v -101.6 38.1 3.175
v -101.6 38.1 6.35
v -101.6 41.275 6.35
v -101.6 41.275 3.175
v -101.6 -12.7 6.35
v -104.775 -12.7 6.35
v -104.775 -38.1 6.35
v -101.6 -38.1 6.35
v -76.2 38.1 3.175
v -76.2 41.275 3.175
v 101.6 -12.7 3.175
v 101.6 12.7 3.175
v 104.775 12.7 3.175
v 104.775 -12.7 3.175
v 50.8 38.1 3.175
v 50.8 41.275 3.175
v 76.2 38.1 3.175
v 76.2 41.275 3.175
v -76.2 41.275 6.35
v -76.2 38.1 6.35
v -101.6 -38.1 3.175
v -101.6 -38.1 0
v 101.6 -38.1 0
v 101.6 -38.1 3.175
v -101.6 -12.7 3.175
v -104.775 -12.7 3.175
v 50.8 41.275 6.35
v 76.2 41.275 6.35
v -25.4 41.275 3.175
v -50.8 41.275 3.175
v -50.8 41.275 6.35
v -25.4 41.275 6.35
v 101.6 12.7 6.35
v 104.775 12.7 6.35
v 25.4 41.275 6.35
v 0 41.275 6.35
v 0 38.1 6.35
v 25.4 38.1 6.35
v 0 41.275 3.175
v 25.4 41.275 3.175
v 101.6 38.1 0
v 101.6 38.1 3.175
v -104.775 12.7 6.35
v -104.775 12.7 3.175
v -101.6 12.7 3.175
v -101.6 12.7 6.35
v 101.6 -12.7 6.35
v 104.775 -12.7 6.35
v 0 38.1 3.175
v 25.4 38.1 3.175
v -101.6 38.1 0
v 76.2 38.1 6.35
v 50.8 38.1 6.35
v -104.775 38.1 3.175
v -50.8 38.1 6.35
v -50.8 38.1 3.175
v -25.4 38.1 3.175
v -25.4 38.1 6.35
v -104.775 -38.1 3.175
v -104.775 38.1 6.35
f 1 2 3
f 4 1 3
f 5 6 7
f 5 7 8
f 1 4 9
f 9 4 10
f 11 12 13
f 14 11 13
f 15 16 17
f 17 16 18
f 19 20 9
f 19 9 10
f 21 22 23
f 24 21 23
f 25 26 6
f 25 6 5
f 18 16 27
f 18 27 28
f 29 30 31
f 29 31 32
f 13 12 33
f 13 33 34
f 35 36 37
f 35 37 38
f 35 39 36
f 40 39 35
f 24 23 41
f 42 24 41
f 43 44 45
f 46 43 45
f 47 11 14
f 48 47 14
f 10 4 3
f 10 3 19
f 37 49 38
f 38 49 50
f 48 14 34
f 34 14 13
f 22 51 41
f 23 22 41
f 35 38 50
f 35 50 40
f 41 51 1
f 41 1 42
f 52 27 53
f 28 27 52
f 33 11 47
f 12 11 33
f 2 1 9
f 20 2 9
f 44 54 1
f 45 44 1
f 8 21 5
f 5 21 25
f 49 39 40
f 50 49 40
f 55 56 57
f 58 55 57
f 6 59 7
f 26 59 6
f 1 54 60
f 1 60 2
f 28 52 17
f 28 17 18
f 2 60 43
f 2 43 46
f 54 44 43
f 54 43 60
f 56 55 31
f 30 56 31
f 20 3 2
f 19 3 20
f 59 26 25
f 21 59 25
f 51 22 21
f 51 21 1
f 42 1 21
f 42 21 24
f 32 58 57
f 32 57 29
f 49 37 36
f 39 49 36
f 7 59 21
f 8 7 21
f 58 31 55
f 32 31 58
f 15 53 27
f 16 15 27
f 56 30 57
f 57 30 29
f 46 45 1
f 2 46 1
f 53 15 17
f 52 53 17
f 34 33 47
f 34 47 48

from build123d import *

# Parameters (mm, degrees)
SKETCH1_W             = 203.2
SKETCH1_H             = 76.2
BOSS_EXTRUDE1_DEPTH   = 3.175
SKETCH2_W             = 25.4
SKETCH2_H             = 3.175
BOSS_EXTRUDE2_DEPTH   = 3.175
BOSS_EXTRUDE2_2_DEPTH = 3.175
BOSS_EXTRUDE2_3_DEPTH = 3.175
BOSS_EXTRUDE2_4_DEPTH = 3.175
SKETCH4_W             = 3.175
SKETCH4_H             = 25.4
BOSS_EXTRUDE4_DEPTH   = 3.175
BOSS_EXTRUDE4_2_DEPTH = 3.175
SKETCH6_W             = 3.175
SKETCH6_H             = 25.4
BOSS_EXTRUDE6_DEPTH   = 3.175


with BuildPart() as part:
    # Sketch1 → Boss-Extrude1 (new body)
    with BuildSketch(Plane.XY):
        Rectangle(SKETCH1_W, SKETCH1_H)
    extrude(amount=BOSS_EXTRUDE1_DEPTH)


with BuildPart() as body_2:
    # Sketch2 → Boss-Extrude2 (new body)
    with BuildSketch(Plane.XY.offset(3.175)):
        with Locations((-38.1, 39.6875)):
            Rectangle(SKETCH2_W, SKETCH2_H)
    extrude(amount=BOSS_EXTRUDE2_DEPTH)


with BuildPart() as body_3:
    # Sketch2 → Boss-Extrude2 2 (new body)
    with BuildSketch(Plane.XY.offset(3.175)):
        with Locations((-88.9, 39.6875)):
            Rectangle(SKETCH2_W, SKETCH2_H)
    extrude(amount=BOSS_EXTRUDE2_2_DEPTH)


with BuildPart() as body_4:
    # Sketch2 → Boss-Extrude2 3 (new body)
    with BuildSketch(Plane.XY.offset(3.175)):
        with Locations((12.7, 39.6875)):
            Rectangle(SKETCH2_W, SKETCH2_H)
    extrude(amount=BOSS_EXTRUDE2_3_DEPTH)


with BuildPart() as body_5:
    # Sketch2 → Boss-Extrude2 4 (new body)
    with BuildSketch(Plane.XY.offset(3.175)):
        with Locations((63.5, 39.6875)):
            Rectangle(SKETCH2_W, SKETCH2_H)
    extrude(amount=BOSS_EXTRUDE2_4_DEPTH)


with BuildPart() as body_6:
    # Sketch4 → Boss-Extrude4 (new body)
    with BuildSketch(Plane.XY.offset(3.175)):
        with Locations((-103.1875, -25.4)):
            Rectangle(SKETCH4_W, SKETCH4_H)
    extrude(amount=BOSS_EXTRUDE4_DEPTH)


with BuildPart() as body_7:
    # Sketch4 → Boss-Extrude4 2 (new body)
    with BuildSketch(Plane.XY.offset(3.175)):
        with Locations((-103.1875, 25.4)):
            Rectangle(SKETCH4_W, SKETCH4_H)
    extrude(amount=BOSS_EXTRUDE4_2_DEPTH)


with BuildPart() as body_8:
    # Sketch6 → Boss-Extrude6 (new body)
    with BuildSketch(Plane.XY.offset(3.175)):
        with Locations((103.1875, 0)):
            Rectangle(SKETCH6_W, SKETCH6_H)
    extrude(amount=BOSS_EXTRUDE6_DEPTH)


solid = Compound([part.part, body_2.part, body_3.part, body_4.part, body_5.part, body_6.part, body_7.part, body_8.part])
